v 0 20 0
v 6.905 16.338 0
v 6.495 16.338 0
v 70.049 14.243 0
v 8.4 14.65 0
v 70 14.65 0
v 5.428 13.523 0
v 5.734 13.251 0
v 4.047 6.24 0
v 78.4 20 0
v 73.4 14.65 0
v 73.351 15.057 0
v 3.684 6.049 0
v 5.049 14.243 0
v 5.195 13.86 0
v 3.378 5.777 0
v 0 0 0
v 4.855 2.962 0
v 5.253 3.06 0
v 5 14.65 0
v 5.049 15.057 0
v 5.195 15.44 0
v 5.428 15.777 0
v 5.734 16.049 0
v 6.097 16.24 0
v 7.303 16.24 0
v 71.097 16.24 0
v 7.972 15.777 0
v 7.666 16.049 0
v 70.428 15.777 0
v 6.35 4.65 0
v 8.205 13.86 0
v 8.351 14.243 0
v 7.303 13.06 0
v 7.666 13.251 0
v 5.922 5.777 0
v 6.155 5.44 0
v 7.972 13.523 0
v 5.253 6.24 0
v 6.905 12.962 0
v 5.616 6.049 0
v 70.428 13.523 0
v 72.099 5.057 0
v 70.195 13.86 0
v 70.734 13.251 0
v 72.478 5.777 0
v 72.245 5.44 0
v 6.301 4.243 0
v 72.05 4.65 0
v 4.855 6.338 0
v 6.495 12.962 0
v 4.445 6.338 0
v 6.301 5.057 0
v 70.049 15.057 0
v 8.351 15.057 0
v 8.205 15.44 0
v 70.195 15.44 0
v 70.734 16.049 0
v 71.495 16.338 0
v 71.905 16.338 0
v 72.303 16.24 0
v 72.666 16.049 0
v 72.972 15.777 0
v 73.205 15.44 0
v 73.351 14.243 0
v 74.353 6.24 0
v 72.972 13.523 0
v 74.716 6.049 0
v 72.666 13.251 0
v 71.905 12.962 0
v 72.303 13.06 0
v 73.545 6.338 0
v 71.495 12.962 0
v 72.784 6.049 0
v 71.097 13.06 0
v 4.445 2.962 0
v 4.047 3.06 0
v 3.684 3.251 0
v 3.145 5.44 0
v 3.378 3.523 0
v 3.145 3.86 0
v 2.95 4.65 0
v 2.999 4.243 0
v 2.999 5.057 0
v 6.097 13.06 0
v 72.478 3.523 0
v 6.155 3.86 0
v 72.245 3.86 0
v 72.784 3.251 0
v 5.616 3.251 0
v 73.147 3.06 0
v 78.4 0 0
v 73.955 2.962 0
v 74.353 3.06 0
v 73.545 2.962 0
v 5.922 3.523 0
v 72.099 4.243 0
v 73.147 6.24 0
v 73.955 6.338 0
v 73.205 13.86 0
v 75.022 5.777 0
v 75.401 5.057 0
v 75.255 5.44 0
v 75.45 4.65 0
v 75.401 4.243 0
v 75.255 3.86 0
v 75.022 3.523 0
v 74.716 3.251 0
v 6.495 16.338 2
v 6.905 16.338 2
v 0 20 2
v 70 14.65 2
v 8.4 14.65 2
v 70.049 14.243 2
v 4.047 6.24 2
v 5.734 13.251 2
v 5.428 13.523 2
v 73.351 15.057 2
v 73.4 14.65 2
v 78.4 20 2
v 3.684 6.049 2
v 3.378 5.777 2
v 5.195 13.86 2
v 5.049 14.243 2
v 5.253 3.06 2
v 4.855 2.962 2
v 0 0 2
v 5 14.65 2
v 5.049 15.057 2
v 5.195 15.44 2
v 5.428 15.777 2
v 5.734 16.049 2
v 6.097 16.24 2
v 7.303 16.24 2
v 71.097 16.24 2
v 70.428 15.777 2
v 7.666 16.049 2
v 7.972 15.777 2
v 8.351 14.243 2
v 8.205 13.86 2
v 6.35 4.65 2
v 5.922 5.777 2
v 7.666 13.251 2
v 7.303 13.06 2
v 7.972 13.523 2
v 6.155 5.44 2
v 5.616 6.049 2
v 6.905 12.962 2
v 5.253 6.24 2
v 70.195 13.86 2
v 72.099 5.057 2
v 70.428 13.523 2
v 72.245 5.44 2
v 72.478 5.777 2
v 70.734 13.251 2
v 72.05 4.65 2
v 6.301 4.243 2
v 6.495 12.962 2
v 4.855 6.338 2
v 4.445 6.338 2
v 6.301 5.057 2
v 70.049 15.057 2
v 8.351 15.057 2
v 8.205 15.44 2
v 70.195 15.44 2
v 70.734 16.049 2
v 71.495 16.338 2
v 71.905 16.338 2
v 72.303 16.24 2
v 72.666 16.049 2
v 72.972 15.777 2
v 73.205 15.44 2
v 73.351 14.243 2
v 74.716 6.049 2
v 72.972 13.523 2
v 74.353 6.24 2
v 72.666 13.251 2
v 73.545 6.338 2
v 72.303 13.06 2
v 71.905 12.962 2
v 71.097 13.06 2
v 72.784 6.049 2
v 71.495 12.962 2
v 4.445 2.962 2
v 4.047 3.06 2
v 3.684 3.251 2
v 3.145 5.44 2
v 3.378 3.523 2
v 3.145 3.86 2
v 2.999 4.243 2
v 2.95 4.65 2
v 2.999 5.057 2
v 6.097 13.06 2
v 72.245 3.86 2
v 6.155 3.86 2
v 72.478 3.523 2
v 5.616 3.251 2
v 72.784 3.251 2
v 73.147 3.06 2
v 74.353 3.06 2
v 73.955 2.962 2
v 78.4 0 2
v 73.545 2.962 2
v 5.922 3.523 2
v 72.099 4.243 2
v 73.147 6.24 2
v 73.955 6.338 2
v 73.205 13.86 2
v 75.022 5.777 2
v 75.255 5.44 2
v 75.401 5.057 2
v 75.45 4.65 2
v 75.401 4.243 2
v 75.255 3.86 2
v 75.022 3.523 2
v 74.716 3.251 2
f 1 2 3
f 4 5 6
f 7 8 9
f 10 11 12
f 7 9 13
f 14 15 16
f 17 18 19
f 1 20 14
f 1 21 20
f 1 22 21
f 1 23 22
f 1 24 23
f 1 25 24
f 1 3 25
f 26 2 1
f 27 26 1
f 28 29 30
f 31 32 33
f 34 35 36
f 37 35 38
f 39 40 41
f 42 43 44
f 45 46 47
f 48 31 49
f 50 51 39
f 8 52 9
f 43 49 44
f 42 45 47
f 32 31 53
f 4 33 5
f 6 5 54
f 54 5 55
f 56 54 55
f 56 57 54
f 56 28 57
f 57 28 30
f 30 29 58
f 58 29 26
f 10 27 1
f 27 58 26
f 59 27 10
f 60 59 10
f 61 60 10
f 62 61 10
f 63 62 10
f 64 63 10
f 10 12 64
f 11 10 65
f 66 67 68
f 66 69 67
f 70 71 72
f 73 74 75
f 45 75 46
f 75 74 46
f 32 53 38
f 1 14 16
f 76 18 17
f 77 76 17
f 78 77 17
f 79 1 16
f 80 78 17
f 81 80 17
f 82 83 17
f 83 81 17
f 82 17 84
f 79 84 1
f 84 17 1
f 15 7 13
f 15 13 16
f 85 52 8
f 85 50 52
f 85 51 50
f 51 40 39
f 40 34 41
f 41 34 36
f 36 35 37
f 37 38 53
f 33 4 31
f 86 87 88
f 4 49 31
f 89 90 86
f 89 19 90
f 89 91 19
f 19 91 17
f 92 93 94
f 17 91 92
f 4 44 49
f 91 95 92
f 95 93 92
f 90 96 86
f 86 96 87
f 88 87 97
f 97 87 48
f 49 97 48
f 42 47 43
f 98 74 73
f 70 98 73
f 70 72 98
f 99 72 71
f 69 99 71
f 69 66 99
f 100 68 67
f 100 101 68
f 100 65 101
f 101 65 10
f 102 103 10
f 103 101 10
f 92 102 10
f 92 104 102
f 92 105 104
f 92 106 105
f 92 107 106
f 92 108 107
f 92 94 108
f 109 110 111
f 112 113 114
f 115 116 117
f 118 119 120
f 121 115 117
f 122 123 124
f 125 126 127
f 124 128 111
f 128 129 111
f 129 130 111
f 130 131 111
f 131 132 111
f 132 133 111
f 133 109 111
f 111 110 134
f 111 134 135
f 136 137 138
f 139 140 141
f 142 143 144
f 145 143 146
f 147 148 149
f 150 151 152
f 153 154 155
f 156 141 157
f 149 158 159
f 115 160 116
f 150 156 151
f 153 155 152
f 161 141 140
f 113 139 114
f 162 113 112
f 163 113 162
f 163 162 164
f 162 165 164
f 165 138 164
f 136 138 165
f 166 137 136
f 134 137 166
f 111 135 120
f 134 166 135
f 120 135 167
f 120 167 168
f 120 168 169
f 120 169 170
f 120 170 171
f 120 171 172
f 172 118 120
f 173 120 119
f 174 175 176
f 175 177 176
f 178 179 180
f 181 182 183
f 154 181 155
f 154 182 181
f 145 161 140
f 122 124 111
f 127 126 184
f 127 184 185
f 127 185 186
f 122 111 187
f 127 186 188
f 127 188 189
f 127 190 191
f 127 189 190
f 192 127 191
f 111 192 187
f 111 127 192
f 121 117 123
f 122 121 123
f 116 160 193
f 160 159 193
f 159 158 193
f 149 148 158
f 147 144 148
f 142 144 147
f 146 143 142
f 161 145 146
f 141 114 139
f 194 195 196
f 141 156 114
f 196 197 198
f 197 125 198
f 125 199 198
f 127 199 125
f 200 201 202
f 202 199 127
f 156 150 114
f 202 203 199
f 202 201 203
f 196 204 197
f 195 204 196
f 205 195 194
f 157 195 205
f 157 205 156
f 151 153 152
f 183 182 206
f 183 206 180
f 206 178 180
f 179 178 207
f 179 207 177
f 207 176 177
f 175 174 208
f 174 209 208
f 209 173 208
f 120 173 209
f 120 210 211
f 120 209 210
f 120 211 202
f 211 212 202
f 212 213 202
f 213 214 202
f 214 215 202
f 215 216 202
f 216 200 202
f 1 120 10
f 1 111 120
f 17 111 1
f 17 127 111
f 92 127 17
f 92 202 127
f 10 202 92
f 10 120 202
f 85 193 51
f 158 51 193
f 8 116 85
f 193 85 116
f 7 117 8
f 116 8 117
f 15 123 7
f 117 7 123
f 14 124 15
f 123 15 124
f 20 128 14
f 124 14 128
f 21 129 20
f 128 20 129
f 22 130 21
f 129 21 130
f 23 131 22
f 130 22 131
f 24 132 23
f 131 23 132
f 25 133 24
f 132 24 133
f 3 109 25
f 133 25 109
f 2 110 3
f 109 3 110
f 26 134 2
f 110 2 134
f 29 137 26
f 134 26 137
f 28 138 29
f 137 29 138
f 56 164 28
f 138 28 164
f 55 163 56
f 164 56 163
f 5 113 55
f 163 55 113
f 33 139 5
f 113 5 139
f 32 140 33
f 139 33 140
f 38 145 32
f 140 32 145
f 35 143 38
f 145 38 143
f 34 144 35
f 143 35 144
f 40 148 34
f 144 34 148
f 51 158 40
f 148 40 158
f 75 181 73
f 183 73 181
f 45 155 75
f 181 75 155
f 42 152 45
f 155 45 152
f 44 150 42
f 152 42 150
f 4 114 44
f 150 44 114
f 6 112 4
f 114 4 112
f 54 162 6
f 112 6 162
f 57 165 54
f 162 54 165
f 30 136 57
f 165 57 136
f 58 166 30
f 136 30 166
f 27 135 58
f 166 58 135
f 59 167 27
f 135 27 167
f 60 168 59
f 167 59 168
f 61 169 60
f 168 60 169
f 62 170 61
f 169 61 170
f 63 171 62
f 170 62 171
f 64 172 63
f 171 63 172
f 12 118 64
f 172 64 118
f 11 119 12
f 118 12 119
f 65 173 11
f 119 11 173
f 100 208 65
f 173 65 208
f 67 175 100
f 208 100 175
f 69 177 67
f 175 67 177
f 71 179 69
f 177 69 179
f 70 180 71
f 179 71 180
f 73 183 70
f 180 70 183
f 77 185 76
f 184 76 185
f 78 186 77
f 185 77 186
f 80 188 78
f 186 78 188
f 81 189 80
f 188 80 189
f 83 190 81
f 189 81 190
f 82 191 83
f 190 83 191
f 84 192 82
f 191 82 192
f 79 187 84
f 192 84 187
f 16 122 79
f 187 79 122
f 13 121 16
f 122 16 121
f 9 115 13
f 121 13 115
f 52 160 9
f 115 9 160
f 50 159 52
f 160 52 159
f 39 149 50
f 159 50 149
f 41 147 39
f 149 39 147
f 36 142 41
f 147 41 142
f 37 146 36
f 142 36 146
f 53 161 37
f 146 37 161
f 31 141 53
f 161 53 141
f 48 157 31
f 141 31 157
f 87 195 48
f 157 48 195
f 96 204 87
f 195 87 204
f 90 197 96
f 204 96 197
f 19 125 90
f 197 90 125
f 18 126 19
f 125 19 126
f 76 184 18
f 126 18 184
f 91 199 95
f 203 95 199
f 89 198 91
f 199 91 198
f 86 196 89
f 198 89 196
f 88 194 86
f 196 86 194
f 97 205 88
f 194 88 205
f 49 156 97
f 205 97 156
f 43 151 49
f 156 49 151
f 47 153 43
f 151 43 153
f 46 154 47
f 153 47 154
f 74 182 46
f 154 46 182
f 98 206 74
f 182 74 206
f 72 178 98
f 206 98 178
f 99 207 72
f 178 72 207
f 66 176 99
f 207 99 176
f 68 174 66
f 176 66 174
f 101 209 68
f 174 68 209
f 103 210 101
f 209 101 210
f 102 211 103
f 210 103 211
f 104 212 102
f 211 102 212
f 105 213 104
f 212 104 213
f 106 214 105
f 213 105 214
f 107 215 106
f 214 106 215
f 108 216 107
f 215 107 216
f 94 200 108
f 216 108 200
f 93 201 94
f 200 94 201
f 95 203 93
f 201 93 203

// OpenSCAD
// Early mount system for custom board on activity bot

$fa = 1;
$fs = 0.4;

holed1 = 69.1;
holed2 = 65;
hole_radius = 1.65;

linear_extrude(height=2,convexity=10)difference(){
		square([holed1+2*hole_radius+2*3,20]);
        new_radius = 1.7;
		translate([3+hole_radius,3+hole_radius])scale(new_radius/1.65)circle(r=hole_radius);
		translate([3+hole_radius+holed1,3+hole_radius])scale(new_radius/1.65)circle(r=hole_radius);
		translate([3+hole_radius+4.1/2,3+hole_radius+10])scale(new_radius/1.65)circle(r=hole_radius);
		translate([3+hole_radius+holed2+4.1/2,3+hole_radius+10])scale(new_radius/1.65)circle(r=hole_radius);
	}
